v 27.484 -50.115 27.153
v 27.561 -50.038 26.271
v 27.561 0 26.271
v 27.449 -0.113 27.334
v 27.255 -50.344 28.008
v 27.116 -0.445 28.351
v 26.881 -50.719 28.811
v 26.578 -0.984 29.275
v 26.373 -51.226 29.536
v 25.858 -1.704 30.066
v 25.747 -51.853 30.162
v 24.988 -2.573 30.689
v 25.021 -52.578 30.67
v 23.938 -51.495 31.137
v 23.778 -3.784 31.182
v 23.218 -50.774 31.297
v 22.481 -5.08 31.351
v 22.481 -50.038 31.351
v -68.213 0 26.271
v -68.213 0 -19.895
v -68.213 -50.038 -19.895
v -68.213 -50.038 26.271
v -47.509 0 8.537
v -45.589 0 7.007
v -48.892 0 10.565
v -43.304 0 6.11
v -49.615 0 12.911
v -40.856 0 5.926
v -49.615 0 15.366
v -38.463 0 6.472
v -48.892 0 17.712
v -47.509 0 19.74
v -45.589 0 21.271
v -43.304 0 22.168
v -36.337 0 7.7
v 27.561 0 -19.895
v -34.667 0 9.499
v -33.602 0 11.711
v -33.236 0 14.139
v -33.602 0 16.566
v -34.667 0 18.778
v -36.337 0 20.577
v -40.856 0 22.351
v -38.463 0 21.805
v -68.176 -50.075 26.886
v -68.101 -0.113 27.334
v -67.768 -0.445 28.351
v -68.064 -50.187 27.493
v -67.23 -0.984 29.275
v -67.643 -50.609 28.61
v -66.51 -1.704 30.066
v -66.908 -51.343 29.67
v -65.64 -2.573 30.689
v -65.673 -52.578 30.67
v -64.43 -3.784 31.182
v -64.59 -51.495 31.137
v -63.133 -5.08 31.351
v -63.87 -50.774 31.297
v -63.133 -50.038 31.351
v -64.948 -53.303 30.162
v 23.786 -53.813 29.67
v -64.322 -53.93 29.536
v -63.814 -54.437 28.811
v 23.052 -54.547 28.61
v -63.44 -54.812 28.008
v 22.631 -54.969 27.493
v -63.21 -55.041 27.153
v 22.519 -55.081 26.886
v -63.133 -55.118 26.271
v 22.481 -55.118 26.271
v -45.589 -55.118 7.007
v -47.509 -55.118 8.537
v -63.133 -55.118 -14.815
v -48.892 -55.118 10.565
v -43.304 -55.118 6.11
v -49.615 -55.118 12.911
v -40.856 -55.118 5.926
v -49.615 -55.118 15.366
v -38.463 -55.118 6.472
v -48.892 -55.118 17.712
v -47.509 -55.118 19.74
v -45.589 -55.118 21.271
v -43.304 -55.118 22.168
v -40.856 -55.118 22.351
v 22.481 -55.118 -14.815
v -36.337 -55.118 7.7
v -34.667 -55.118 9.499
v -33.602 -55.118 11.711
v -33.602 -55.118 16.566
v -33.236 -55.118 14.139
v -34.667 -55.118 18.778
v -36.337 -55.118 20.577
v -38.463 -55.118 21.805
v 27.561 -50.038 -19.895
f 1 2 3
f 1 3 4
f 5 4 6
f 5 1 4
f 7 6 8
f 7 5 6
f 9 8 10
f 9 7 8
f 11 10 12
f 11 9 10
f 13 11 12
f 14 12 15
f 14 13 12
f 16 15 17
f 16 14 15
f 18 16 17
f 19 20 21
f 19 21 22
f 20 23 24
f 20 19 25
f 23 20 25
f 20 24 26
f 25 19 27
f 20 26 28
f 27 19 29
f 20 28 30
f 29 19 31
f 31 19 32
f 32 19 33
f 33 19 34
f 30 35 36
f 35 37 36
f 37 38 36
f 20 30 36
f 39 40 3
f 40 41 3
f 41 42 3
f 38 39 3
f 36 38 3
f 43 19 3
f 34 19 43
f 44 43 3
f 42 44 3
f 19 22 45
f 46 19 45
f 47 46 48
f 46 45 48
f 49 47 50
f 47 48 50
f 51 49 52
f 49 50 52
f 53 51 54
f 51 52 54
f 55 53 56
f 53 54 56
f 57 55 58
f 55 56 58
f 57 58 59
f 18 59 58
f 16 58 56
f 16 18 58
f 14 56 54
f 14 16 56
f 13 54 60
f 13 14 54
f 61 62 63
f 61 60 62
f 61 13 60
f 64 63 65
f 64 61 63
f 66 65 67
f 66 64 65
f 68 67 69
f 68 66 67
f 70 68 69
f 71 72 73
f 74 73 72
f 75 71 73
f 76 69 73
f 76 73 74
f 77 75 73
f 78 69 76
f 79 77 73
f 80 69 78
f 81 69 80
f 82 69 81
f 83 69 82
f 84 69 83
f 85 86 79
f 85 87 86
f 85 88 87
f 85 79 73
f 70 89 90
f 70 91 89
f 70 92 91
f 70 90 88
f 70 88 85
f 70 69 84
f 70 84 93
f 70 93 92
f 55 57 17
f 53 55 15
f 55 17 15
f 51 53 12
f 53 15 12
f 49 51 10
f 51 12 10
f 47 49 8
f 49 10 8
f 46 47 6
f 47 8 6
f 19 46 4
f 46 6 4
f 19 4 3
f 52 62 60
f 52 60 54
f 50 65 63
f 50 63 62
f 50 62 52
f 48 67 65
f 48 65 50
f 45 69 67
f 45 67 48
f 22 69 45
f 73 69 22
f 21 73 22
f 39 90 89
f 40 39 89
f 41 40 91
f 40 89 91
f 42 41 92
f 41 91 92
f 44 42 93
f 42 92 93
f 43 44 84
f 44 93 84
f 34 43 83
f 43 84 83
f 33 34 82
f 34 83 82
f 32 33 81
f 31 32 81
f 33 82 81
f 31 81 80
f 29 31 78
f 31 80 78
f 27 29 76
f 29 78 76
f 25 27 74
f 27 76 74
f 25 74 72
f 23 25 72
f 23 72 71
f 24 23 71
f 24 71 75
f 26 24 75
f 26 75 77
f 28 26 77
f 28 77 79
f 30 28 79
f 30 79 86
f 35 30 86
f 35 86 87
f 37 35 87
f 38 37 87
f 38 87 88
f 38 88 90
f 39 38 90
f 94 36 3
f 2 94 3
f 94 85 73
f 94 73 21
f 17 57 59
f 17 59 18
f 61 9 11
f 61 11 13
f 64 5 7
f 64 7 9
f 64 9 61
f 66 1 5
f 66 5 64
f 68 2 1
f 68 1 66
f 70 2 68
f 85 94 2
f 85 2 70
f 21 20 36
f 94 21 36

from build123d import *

# Parameters (mm, degrees)
F0_W        = 95.7747641951
F0_H        = 51.2457955629
F1_DEPTH    = 55.118
F2_R        = 5.08
F3_T1_DEPTH = 72.2940947206
F3_T3_DEPTH = 121.9030633528
F4_R        = 8.2354501167
F5_DEPTH    = 129.032


# Not quite as in the source:
# - a fillet or chamfer that OpenCascade refuses, or shapes differently, is made with other operations: its cross-section is extruded or revolved along the edge and cut away or added


with BuildPart() as f1:
    # F0 (on Front) → F1 (new body)
    with BuildSketch(Plane.XZ):
        with Locations((-20.3259242699, 5.727651529)):
            Rectangle(F0_W, F0_H)
    extrude(amount=F1_DEPTH)

    # F2
    f2_edges = [f1.edges().sort_by_distance(p)[0] for p in [
        (27.561458, -27.559, 31.350549),
        (-68.213306, -27.559, 31.350549),
        (-20.325924, 0, 31.350549),
        (-20.325924, -55.118, 31.350549),
    ]]
    fillet(f2_edges, radius=F2_R)

    # F3: chamfer of 5.08 on 4 edges, made by hand

    # F3_s2 → F3_t1 (cut)
    with BuildSketch(Plane.XY.offset(-32.9593958313)):
        Polygon((-63.1333063674, -55.118), (-68.2133063674, -50.038), (-68.2133063674, -55.118), align=None)
        Polygon((27.5614578277, -50.038), (22.4814578277, -55.118), (27.5614578277, -55.118), align=None)
    extrude(amount=F3_T1_DEPTH, mode=Mode.SUBTRACT)

    # F3_s4 → F3_t3 (cut)
    with BuildSketch(Plane.YZ.offset(-81.2774559463)):
        Polygon((-55.118, -14.8152462524), (-50.038, -19.8952462524), (-55.118, -19.8952462524), align=None)
    extrude(amount=F3_T3_DEPTH, mode=Mode.SUBTRACT)

    # F4 (on face) → F5 (cut)
    with BuildSketch(Plane.XZ.offset(55.118)):
        with Locations((-41.4717569947, 14.13862966)):
            Circle(F4_R)
    extrude(amount=-F5_DEPTH, mode=Mode.SUBTRACT)


solid = f1.part
